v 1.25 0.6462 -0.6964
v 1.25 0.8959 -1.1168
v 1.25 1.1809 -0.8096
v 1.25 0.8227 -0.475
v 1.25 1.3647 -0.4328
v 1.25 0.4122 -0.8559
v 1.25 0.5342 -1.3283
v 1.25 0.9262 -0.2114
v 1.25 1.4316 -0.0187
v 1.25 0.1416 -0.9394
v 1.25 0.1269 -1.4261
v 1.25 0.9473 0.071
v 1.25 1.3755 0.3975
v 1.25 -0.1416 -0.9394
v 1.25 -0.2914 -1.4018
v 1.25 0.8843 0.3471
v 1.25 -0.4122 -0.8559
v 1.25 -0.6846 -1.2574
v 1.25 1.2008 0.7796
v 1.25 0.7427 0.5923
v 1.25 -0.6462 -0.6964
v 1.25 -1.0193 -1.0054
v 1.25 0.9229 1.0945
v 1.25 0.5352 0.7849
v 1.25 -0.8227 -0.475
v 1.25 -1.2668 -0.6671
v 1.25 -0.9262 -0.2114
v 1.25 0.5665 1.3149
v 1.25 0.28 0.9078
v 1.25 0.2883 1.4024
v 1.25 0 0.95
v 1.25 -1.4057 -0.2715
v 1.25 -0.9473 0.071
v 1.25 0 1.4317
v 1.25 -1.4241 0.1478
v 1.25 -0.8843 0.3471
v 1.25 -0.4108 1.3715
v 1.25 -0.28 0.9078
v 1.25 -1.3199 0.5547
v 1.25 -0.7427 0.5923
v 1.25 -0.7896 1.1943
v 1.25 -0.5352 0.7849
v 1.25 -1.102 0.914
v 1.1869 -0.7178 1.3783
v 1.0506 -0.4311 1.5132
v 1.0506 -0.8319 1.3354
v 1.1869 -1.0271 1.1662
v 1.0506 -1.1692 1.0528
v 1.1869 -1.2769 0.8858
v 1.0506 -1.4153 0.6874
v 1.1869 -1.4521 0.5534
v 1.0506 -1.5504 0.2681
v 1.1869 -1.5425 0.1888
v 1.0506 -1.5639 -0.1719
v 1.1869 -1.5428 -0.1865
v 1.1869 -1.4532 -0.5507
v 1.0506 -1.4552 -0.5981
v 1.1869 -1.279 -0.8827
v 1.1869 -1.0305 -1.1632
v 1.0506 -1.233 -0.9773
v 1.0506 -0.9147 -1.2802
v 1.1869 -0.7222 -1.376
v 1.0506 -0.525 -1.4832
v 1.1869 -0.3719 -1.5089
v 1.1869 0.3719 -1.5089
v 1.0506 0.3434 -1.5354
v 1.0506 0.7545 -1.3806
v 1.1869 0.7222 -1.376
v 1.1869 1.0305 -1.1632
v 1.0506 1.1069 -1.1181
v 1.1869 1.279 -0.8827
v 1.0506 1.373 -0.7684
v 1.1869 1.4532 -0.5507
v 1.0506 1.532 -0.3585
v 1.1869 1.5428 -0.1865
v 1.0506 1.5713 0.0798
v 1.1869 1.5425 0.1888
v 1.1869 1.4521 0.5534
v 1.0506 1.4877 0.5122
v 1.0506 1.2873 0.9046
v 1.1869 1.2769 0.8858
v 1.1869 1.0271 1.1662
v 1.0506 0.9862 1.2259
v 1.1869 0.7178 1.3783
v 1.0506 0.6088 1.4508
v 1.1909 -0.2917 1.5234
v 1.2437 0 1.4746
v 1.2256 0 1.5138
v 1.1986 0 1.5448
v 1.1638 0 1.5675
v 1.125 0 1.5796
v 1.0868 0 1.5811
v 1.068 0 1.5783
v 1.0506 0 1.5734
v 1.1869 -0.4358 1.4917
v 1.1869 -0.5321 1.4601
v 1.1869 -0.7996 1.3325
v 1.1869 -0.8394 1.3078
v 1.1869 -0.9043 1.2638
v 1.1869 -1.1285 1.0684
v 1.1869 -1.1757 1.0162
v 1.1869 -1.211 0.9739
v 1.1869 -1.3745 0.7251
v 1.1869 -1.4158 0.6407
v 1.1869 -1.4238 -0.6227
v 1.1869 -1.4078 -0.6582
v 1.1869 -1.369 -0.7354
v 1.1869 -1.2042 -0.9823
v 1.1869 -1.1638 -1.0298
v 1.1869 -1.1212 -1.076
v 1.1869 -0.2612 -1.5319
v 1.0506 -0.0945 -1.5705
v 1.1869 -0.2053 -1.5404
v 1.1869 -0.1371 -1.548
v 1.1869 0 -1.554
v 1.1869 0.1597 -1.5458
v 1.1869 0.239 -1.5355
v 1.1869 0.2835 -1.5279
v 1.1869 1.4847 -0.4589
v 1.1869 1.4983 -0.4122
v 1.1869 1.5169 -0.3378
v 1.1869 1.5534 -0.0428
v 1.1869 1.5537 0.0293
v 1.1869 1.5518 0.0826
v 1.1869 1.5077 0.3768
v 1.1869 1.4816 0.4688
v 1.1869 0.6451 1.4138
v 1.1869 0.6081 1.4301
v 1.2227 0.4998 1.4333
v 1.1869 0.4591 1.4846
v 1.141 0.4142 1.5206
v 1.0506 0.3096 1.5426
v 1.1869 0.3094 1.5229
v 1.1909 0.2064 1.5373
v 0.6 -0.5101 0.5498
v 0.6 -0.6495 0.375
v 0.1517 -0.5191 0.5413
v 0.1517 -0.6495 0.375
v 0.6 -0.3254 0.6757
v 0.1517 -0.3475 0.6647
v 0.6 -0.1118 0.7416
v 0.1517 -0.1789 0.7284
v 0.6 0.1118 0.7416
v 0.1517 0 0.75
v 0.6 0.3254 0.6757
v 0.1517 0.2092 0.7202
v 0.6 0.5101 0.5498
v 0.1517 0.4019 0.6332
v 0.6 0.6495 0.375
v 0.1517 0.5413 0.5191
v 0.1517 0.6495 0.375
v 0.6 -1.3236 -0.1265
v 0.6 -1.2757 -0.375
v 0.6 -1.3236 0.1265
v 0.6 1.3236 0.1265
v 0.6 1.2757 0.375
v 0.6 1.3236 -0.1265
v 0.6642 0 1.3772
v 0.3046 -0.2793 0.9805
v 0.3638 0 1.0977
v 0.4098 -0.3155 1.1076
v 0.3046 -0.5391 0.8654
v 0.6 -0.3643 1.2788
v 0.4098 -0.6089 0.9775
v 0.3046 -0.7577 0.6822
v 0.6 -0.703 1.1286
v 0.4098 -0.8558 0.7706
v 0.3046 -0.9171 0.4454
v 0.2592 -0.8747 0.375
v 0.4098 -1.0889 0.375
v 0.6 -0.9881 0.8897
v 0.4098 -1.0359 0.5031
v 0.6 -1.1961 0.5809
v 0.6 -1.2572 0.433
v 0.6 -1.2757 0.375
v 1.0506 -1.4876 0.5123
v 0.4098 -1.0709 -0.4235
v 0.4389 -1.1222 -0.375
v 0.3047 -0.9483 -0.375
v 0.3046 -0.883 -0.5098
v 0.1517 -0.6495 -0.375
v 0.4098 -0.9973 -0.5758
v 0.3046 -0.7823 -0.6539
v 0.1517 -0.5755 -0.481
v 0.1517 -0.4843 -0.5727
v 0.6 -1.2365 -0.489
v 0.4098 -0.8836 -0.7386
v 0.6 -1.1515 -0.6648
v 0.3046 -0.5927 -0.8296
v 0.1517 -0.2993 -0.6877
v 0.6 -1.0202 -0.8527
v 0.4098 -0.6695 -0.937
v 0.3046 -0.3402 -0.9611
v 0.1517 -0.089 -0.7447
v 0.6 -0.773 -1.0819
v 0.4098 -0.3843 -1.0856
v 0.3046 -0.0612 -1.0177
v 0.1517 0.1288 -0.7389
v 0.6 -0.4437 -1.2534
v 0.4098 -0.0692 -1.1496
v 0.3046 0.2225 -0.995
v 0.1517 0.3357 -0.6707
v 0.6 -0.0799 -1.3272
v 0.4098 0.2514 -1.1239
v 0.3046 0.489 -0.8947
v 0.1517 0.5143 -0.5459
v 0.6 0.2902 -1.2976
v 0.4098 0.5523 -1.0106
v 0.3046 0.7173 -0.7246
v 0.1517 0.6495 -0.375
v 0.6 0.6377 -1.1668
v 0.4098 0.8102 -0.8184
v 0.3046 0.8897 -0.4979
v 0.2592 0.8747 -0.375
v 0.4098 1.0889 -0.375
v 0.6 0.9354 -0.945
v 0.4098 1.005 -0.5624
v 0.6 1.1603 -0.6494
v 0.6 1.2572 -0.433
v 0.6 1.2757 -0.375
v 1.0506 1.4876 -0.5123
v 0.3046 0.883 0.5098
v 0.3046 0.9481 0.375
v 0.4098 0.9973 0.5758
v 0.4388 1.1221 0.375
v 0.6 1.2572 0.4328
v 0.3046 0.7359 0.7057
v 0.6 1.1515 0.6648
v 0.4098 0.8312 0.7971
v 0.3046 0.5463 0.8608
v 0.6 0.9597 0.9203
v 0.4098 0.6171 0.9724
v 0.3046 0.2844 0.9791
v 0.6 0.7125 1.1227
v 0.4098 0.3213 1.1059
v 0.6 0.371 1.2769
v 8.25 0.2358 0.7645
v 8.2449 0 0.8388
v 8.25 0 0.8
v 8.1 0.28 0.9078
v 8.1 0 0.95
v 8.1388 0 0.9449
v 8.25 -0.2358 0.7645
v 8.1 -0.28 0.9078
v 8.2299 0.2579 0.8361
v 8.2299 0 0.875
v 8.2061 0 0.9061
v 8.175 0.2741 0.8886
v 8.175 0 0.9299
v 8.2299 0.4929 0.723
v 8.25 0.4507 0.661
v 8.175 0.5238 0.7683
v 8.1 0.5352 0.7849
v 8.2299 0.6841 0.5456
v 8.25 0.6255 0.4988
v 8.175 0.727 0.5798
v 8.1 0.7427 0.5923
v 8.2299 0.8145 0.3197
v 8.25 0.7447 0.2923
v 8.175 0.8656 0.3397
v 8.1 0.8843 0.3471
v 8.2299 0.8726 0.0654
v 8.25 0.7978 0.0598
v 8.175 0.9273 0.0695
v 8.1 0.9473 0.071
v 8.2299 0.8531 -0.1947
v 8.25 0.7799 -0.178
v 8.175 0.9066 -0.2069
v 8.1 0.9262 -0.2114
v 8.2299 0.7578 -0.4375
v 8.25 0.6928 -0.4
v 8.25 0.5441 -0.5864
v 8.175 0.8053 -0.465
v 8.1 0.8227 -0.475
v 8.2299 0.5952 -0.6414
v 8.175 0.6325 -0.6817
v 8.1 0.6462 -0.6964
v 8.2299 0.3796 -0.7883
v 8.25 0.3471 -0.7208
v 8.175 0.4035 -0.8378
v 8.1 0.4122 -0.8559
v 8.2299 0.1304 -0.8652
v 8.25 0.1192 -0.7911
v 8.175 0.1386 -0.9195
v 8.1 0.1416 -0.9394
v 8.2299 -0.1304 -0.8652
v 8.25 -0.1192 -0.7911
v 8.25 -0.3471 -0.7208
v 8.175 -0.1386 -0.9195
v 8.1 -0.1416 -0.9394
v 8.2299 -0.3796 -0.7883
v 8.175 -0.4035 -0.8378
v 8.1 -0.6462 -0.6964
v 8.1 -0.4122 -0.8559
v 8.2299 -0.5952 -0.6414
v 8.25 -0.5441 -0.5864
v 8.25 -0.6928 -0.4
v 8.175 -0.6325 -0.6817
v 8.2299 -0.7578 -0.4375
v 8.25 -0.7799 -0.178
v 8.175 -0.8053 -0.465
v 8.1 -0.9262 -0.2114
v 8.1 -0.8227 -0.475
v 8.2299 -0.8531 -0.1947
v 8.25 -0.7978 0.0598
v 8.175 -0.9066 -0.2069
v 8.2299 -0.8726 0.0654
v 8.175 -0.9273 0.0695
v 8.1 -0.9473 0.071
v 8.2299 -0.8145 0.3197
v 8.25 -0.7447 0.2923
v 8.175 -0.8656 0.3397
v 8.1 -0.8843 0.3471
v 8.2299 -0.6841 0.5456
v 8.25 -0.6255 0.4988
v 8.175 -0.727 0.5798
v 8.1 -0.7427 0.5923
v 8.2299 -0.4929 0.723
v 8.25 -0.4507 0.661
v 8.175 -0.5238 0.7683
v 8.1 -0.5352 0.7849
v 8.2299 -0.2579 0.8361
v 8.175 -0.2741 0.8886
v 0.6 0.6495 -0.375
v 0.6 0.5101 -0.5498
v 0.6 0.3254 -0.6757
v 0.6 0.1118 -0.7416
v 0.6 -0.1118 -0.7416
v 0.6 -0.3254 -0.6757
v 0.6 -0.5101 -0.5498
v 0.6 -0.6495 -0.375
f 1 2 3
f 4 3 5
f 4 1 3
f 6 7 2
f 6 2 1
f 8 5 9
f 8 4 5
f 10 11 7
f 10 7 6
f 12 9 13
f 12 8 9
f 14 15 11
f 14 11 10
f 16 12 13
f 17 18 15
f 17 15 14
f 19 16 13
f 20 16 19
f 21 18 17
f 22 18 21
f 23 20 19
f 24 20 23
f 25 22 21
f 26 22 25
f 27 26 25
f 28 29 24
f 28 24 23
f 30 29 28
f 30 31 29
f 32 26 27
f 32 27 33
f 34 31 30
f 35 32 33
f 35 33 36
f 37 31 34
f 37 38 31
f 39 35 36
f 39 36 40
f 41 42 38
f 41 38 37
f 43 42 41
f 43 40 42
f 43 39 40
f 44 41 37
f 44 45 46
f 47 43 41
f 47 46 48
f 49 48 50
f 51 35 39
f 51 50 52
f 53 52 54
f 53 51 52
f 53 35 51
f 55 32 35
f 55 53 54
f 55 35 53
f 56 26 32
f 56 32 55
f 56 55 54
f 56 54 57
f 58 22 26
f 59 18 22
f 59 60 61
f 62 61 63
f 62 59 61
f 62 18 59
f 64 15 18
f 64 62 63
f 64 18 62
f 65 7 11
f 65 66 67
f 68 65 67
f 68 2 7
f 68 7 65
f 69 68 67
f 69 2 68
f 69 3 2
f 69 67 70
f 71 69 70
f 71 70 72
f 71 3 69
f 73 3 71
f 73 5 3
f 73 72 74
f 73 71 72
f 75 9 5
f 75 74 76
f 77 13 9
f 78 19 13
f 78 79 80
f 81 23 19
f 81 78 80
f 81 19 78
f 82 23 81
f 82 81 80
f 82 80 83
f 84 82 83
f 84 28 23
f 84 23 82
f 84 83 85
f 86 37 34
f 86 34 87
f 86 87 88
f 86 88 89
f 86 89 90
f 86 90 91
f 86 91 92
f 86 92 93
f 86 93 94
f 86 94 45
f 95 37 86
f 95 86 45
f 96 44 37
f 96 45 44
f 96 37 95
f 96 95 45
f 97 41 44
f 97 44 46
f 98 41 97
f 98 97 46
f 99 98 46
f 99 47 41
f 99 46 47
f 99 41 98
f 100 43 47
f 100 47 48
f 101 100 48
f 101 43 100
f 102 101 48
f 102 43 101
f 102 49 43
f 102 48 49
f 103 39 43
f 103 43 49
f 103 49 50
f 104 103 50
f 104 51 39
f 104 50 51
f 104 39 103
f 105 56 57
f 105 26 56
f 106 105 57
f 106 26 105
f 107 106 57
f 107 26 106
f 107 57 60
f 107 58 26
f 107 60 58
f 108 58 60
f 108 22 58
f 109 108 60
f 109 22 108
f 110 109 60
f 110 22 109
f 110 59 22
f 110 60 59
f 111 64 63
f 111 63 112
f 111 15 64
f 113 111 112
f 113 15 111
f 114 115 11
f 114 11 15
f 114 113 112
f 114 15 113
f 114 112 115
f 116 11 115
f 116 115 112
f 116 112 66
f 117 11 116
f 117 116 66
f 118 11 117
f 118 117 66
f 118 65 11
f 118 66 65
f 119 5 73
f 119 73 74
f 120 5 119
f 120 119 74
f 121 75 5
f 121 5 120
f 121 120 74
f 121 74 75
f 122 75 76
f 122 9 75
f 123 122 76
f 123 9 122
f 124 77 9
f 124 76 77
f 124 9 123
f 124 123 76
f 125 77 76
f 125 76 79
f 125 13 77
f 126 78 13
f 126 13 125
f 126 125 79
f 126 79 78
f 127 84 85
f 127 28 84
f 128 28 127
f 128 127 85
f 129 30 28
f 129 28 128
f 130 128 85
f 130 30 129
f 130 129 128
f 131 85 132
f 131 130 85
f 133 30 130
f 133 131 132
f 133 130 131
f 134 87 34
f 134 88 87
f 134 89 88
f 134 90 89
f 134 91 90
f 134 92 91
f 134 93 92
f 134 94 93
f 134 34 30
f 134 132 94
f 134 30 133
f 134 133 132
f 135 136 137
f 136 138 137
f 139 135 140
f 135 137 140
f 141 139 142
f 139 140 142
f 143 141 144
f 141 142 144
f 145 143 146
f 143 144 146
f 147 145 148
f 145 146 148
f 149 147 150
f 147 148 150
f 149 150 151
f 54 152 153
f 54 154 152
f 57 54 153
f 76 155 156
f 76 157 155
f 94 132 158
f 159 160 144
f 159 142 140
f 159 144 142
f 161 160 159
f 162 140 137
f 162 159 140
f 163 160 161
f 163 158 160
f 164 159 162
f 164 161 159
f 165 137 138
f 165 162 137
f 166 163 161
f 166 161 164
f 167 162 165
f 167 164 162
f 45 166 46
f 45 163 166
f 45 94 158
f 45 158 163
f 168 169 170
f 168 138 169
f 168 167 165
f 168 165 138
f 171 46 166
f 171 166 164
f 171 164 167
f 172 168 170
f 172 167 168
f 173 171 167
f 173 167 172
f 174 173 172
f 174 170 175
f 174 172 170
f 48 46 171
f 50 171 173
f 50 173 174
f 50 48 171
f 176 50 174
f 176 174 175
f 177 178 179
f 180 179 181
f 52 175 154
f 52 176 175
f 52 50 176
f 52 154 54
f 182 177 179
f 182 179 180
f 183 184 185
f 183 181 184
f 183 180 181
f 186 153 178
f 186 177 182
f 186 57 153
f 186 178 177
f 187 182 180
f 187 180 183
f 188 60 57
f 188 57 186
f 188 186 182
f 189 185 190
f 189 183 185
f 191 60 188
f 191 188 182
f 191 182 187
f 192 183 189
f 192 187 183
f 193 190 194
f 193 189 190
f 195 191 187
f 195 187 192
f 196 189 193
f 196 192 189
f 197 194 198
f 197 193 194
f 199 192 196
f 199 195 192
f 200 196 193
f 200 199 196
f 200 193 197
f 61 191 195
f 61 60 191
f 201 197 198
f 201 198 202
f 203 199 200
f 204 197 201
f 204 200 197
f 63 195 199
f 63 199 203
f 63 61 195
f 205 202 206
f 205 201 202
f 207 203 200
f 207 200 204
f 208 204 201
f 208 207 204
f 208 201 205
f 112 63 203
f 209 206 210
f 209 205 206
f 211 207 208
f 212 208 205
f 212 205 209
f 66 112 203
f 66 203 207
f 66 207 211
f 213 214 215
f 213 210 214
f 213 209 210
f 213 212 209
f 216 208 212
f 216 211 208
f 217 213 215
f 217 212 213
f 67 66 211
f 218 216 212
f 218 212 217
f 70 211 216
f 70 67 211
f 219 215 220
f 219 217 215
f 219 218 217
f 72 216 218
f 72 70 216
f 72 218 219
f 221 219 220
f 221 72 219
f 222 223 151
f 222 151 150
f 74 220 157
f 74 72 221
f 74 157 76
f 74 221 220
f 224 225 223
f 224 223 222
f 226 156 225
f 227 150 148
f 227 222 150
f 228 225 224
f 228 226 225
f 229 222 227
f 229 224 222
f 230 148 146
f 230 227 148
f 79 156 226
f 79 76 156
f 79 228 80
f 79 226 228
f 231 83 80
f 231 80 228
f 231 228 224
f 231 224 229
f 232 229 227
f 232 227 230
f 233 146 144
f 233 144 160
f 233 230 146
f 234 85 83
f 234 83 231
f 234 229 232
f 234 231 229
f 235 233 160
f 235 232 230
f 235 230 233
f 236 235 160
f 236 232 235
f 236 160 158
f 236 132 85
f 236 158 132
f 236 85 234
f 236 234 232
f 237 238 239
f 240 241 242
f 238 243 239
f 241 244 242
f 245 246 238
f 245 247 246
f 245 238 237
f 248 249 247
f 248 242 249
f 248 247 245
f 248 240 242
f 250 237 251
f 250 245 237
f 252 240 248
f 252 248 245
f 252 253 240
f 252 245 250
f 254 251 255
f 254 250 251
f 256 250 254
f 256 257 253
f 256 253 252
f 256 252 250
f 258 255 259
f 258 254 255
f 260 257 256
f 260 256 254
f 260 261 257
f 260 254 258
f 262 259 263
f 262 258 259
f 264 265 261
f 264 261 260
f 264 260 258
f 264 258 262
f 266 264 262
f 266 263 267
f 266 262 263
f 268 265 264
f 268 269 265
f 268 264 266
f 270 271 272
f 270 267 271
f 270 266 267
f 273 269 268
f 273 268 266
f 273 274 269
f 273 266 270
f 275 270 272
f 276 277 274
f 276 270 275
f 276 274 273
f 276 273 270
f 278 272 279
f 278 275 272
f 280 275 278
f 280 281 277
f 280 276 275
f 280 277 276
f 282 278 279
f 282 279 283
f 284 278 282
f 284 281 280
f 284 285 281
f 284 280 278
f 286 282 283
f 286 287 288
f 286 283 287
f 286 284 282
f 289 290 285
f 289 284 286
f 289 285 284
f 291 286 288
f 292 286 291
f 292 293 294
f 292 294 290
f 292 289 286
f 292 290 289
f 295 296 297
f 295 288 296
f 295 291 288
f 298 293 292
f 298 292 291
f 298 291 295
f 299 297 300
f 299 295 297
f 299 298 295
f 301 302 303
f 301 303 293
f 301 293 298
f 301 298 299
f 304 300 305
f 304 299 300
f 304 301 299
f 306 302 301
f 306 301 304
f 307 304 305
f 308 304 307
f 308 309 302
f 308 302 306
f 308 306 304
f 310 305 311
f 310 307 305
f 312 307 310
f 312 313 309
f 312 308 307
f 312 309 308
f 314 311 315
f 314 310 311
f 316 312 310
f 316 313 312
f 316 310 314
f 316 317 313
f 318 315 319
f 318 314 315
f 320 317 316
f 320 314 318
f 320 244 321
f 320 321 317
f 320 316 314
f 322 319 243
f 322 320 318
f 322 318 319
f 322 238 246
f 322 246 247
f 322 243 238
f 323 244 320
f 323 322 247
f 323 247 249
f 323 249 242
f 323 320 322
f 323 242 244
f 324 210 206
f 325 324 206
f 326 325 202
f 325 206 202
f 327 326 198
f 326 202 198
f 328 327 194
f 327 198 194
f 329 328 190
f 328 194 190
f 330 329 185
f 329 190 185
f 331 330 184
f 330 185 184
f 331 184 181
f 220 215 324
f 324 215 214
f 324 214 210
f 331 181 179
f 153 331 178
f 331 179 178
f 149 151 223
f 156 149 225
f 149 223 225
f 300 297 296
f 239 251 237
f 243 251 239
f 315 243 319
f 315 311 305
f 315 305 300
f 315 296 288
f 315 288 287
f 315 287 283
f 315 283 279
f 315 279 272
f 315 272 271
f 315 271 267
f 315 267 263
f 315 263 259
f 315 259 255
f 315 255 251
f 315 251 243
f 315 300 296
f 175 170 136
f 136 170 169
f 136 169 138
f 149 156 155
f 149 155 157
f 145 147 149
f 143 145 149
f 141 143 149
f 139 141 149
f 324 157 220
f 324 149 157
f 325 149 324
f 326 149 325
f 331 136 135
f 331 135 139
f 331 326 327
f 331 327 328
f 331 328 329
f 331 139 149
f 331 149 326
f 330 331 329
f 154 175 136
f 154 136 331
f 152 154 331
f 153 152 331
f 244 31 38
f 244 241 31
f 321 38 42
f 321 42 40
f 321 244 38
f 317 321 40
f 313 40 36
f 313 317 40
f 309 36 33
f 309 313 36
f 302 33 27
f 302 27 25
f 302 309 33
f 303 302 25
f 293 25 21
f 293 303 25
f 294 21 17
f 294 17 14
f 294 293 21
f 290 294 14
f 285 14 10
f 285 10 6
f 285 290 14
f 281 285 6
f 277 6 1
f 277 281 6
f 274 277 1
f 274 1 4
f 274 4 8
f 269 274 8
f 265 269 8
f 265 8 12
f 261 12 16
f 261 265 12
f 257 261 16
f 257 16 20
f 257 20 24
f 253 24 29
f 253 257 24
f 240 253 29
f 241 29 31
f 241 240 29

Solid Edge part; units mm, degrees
sketch "Sketch1" plane through (0, 0, 0) normal (0, -1, 0) x (1, 0, 0)
  line L0 (1.25, 1.63) -> (1.25, 0.95)
  line L1 (1.25, 0.95) -> (8.25, 0.95)
  line L2 (8.25, 0) -> (8.25, 0.95)
  spline S0 degree 3 poles (0, 0) (0, 0.7831) (0.4356, 1.448) (1.25, 1.63) knots 0 0 0 0 1 1 1 1
revolve "RevolvedProtrusion1" add sketch "Sketch1" angle 360 about axis through (0, 0, 0) along (1, 0, 0)
sketch "Sketch2" plane through (0, 0, 0) normal (1, 0, 0) x (0, 0, 1)
  line L0 (-0.375, 1.9976) -> (0.375, 1.9976)
  line L1 (0.375, 1.9976) -> (0.375, 0.6495)
  arc A0 (0.375, 0.6495) -> (0.375, -0.6495) centre (0, 0) cw
  line L2 (0.375, -0.6495) -> (0.375, -1.9976)
  line L3 (0.375, -1.9976) -> (-0.375, -1.9976)
  line L4 (-0.375, -1.9976) -> (-0.375, -0.6495)
  line L5 (-0.375, 0.6495) -> (-0.375, 1.9976)
  arc A1 (-0.375, -0.6495) -> (-0.375, 0.6495) centre (0, 0) cw
extrude "Cutout1" cut sketch "Sketch2" along normal blind 0.6
fillet "Round_1" radius 0.15 2 edges at (1.25, 0, -1.63) (8.25, 0, -0.95)
properties material "Galvanized steel"
